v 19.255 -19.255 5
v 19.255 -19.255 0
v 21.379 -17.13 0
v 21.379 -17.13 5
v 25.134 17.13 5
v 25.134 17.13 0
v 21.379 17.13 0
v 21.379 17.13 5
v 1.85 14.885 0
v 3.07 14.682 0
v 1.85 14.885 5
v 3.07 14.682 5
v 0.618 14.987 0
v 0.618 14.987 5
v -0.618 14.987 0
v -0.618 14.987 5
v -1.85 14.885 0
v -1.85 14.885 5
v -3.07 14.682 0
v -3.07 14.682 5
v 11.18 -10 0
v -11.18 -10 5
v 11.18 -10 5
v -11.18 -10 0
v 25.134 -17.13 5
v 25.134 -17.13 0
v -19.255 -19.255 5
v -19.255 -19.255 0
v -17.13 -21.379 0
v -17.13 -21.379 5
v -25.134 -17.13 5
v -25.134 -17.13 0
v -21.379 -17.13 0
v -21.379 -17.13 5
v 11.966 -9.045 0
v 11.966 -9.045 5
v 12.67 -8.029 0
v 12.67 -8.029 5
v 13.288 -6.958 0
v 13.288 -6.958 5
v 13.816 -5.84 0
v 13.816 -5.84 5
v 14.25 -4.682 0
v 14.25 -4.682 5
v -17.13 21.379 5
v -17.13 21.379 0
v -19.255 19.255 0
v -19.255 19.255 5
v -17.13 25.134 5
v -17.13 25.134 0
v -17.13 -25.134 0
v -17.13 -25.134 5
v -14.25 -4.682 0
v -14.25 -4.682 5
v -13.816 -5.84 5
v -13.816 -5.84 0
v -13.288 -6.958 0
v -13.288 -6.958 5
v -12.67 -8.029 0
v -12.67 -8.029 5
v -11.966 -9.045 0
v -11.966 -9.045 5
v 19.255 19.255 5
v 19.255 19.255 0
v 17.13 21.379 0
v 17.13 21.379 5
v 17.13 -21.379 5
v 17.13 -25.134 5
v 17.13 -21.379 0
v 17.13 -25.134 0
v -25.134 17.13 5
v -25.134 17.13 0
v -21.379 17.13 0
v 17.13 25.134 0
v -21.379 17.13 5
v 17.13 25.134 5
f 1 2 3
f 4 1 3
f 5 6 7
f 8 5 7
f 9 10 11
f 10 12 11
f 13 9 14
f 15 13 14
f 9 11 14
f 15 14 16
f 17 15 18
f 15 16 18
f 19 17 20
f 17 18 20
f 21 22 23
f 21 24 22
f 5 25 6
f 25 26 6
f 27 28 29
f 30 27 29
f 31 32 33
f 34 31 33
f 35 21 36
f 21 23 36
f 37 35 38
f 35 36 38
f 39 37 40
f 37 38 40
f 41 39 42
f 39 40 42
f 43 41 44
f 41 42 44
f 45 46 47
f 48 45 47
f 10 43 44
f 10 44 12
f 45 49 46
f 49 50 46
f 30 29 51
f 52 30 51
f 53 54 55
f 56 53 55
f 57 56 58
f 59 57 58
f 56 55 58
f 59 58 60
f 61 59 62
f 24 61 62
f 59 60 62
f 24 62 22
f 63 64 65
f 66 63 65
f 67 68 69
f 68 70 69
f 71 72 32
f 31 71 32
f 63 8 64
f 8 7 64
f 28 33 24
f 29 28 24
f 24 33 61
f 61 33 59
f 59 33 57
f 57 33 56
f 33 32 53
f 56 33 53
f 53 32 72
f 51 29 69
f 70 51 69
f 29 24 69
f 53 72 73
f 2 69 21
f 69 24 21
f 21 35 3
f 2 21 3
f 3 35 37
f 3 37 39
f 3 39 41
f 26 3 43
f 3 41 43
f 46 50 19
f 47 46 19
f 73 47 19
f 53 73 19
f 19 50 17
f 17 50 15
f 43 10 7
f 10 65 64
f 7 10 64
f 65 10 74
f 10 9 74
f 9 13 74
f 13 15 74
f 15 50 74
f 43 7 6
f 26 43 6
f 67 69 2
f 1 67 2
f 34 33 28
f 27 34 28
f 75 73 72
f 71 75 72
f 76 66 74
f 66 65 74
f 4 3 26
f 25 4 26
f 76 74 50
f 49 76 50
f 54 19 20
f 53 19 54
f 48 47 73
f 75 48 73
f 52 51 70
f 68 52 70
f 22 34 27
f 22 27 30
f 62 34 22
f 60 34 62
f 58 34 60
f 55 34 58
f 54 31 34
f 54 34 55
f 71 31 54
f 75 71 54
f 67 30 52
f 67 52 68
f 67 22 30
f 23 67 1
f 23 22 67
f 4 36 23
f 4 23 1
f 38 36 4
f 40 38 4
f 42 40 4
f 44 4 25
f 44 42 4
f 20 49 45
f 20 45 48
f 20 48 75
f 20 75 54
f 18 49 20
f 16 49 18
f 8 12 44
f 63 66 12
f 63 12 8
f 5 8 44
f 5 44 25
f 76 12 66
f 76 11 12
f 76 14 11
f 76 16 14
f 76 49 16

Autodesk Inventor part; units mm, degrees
ref_plane "YZ Plane" through (0, 0, 0) normal (1, 0, 0) x (0, 1, 0)
ref_plane "XZ Plane" through (0, 0, 0) normal (0, 1, 0) x (-1, 0, 0)
ref_plane "XY Plane" through (0, 0, 0) normal (0, 0, 1) x (1, 0, 0)
sketch "Sketch1" plane through (0, 0, 0) normal (0, 0, 1) x (1, 0, 0)
  line L0 (-39.2988, 0) -> (59.8542, 0) construction
  line L1 (0, -36.6223) -> (0, 43.7956) construction
  line L2 (0, 0) -> (32.3074, 32.3074) construction
  line L3 (0, 0) -> (45.6895, 0) construction
  line L4 (0, 24.9041) -> (16.9, 24.9041)
  line L5 (16.9, 24.9041) -> (16.9, 21.2841)
  line L6 (16.9, 21.2841) -> (19.092, 19.092)
  line L7 (24.9041, 0) -> (24.9041, 16.9)
  line L8 (24.9041, 16.9) -> (21.2841, 16.9)
  line L9 (21.2841, 16.9) -> (19.092, 19.092)
  line L10 (0, 24.9041) -> (-16.9, 24.9041)
  line L11 (-16.9, 24.9041) -> (-16.9, 21.2841)
  line L12 (-16.9, 21.2841) -> (-19.092, 19.092)
  line L13 (-24.9041, 0) -> (-24.9041, 16.9)
  line L14 (-24.9041, 16.9) -> (-21.2841, 16.9)
  line L15 (-21.2841, 16.9) -> (-19.092, 19.092)
  line L16 (0, -24.9041) -> (16.9, -24.9041)
  line L17 (16.9, -24.9041) -> (16.9, -21.2841)
  line L18 (16.9, -21.2841) -> (19.092, -19.092)
  line L19 (24.9041, 0) -> (24.9041, -16.9)
  line L20 (24.9041, -16.9) -> (21.2841, -16.9)
  line L21 (21.2841, -16.9) -> (19.092, -19.092)
  line L22 (0, -24.9041) -> (-16.9, -24.9041)
  line L23 (-16.9, -24.9041) -> (-16.9, -21.2841)
  line L24 (-16.9, -21.2841) -> (-19.092, -19.092)
  line L25 (-24.9041, 0) -> (-24.9041, -16.9)
  line L26 (-24.9041, -16.9) -> (-21.2841, -16.9)
  line L27 (-21.2841, -16.9) -> (-19.092, -19.092)
  line L28 (17.13, 25.1341) -> (0, 25.1341)
  line L29 (0, 25.1341) -> (-17.13, 25.1341)
  line L30 (-17.13, 25.1341) -> (-17.13, 21.3793)
  line L31 (-17.13, 21.3793) -> (-19.2547, 19.2547)
  line L32 (-19.2547, 19.2547) -> (-21.3793, 17.13)
  line L33 (-21.3793, 17.13) -> (-25.1341, 17.13)
  line L34 (-25.1341, 17.13) -> (-25.1341, 0)
  line L35 (-25.1341, 0) -> (-25.1341, -17.13)
  line L36 (-25.1341, -17.13) -> (-21.3793, -17.13)
  line L37 (-21.3793, -17.13) -> (-19.2547, -19.2547)
  line L38 (-19.2547, -19.2547) -> (-17.13, -21.3793)
  line L39 (-17.13, -21.3793) -> (-17.13, -25.1341)
  line L40 (-17.13, -25.1341) -> (0, -25.1341)
  line L41 (0, -25.1341) -> (17.13, -25.1341)
  line L42 (17.13, -25.1341) -> (17.13, -21.3793)
  line L43 (17.13, -21.3793) -> (19.2547, -19.2547)
  line L44 (19.2547, -19.2547) -> (21.3793, -17.13)
  line L45 (21.3793, -17.13) -> (25.1341, -17.13)
  line L46 (25.1341, -17.13) -> (25.1341, 0)
  line L47 (25.1341, 0) -> (25.1341, 17.13)
  line L48 (25.1341, 17.13) -> (21.3793, 17.13)
  line L49 (21.3793, 17.13) -> (19.2547, 19.2547)
  line L50 (19.2547, 19.2547) -> (17.13, 21.3793)
  line L51 (17.13, 21.3793) -> (17.13, 25.1341)
  dimension "d27" = 45
  dimension "d28" = 16.9
  dimension "d29" = 3.62
  dimension "d30" = 3.1
  dimension "d31" = 0.23
extrude "Extrusion1" add sketch "Sketch1" along normal blind 5 contours L4 L5 L6 L9 L8 L7 L19 L20 L21 L18 L17 L16 L22 L23 L24 L27 L26 L25 L13 L14 L15 L12 L11 L10 | L51 L50 L49 L48 L47 L46 L45 L44 L43 L42 L41 L40 L39 L38 L37 L36 L35 L34 L33 L32 L31 L30 L29 L28
hole "Hole1" at (0, 0, 0) direction (0, 0, 1) diameter 30 end through all
sketch "Sketch2" plane through (0, 0, 0) normal (0, 0, -1) x (-1, 0, 0)
  circle A0 centre (0, 0) radius 15 projected
  line L0 (3.0701, 14.6825) -> (14.2504, -4.6825)
  line L1 (11.1803, -10) -> (-11.1803, -10)
  line L2 (-14.2504, -4.6825) -> (-3.0701, 14.6825)
  circle A1 centre (0, 0) radius 10 construction
  circle A2 centre (0, 0) radius 15 construction
  circle A3 centre (0, 0) radius 15 construction
  arc A4 (14.2504, -4.6825) -> (3.0701, 14.6825) centre (0, 0) ccw
  arc A5 (-11.1803, -10) -> (11.1803, -10) centre (0, 0) ccw
  arc A6 (-3.0701, 14.6825) -> (-14.2504, -4.6825) centre (0, 0) ccw
  dimension "d22" = 20
extrude "Extrusion2" add sketch "Sketch2" against normal up to surface (5 mm away) contours A0 L0 | L2 A0 | A0 L1
equation "\"Lens_diameter\" = 25"
properties part number "LC_objective_holder"
